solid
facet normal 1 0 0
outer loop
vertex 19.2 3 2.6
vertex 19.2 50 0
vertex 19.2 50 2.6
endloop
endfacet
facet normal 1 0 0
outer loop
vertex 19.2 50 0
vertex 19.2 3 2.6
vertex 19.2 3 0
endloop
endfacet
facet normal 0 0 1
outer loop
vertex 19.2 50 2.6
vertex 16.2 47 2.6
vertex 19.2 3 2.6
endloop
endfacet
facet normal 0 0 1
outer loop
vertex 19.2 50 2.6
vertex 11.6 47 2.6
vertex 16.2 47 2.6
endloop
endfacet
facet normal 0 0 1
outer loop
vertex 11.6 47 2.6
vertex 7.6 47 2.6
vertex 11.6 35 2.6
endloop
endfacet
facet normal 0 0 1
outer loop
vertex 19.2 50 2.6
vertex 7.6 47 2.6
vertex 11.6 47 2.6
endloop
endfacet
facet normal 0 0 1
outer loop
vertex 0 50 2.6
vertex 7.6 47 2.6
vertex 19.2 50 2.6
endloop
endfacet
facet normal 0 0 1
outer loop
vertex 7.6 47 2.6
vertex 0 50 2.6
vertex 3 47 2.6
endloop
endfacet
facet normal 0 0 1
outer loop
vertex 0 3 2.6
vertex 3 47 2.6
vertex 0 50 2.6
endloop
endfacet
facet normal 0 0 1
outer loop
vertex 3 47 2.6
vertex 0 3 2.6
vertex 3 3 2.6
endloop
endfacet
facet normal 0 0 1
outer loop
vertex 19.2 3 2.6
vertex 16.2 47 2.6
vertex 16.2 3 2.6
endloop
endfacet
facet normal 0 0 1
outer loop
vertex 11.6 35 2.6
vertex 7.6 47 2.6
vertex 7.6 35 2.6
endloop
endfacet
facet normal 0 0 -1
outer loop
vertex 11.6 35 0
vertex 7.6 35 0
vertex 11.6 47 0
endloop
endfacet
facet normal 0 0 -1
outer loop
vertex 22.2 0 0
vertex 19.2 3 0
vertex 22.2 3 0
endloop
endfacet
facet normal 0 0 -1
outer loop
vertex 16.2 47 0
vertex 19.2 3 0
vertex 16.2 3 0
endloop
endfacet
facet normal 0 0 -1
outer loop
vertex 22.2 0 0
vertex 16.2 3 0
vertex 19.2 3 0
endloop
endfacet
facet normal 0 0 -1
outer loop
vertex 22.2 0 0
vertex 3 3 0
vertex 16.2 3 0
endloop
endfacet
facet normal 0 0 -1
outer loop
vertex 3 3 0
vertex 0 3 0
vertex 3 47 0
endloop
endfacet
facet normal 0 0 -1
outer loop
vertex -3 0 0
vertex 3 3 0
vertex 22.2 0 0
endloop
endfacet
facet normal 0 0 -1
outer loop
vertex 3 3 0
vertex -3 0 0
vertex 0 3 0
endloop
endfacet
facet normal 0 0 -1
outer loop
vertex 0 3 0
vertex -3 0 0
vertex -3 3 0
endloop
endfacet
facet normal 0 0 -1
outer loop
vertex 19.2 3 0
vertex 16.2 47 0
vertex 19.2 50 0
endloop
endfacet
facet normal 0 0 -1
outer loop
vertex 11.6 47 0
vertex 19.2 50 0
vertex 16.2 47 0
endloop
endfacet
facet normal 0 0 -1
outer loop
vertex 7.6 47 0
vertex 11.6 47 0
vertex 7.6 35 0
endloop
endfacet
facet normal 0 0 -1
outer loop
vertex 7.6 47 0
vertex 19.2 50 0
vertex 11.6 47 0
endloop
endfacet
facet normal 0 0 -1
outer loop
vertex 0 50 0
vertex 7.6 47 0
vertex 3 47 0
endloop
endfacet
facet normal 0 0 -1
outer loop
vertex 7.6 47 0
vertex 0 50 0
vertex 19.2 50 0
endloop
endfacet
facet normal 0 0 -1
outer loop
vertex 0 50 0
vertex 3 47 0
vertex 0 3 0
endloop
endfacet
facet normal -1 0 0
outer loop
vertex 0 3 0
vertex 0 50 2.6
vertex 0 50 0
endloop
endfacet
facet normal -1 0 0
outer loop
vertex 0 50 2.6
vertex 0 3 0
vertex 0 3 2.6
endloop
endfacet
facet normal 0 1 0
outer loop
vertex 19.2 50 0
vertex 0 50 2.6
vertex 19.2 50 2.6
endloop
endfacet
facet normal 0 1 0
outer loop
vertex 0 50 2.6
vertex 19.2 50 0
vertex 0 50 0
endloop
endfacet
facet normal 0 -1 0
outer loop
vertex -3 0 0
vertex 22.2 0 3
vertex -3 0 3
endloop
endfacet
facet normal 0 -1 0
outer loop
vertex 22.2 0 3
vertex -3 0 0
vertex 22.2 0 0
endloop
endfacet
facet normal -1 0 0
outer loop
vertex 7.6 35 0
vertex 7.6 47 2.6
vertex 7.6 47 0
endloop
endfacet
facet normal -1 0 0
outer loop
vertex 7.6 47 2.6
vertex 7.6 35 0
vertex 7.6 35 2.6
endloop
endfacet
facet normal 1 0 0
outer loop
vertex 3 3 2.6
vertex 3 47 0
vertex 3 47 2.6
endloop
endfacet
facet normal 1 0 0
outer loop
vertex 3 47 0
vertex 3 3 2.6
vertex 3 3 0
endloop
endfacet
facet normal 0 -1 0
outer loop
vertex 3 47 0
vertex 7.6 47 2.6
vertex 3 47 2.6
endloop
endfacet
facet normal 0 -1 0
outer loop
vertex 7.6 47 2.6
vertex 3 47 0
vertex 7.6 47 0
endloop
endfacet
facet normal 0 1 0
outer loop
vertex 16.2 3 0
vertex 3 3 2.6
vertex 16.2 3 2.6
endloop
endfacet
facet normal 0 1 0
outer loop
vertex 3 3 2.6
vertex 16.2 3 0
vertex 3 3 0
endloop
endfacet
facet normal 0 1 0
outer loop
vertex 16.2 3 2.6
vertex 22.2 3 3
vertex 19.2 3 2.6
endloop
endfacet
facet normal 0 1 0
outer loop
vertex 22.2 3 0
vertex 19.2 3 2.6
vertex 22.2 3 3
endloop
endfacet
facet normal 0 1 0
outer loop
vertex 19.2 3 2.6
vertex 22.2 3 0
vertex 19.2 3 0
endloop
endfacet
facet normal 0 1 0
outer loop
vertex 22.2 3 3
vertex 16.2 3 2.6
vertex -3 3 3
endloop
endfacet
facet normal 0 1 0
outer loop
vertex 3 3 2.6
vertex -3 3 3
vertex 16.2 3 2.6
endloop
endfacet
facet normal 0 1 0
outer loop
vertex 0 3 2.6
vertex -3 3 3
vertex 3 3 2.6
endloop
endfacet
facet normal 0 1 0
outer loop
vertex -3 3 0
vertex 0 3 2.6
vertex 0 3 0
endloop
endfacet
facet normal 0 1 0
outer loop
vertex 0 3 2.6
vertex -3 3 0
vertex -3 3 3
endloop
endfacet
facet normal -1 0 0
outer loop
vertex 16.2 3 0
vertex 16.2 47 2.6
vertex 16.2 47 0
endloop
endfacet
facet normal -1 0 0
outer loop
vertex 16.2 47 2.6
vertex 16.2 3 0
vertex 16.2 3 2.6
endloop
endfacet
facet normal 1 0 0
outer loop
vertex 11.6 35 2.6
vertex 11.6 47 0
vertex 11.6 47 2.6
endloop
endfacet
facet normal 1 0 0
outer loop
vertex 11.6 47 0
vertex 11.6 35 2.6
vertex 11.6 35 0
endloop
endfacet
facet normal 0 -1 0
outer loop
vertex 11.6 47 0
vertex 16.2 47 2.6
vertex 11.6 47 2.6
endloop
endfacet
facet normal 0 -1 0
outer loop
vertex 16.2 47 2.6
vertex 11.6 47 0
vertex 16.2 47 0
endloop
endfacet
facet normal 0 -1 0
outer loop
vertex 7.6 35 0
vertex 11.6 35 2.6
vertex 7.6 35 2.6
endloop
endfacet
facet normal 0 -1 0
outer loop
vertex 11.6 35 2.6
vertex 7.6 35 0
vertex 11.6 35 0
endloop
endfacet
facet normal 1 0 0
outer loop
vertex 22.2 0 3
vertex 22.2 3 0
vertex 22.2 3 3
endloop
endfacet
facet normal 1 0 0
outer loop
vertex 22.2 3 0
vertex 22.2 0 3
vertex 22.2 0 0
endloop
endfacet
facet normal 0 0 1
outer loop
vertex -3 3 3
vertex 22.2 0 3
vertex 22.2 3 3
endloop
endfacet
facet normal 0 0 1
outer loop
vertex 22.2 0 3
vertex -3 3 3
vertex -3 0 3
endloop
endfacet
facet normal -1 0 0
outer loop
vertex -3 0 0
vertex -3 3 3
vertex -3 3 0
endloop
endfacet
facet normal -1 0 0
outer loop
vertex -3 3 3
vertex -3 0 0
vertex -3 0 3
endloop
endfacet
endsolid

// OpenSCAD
/**
 * Originally:
 * Módulo que permite trabajar con patrones hexagonales tipo panal.
 *
 * @author  Joaquín Fernández
 * @url     https://gitlab.com/joaquinfq/openscad/blob/master/Modules/Pattern/honeycomb.scad
 * @license CC-BY-NC-4.0
 * @see     http://www.thingiverse.com/thing:2124344
 * Modified by: John Flinchbaugh
 * Added the sleeve, tabs, and a measurement-sized module.
 */
/**
 * Dibuja un panal de miel completo.
 *
 * @param {Number} columns   Número de columnas (Eje X).
 * @param {Number} rows      Número de filas (Eje Y).
 * @param {Number} height    Altura del cubo (Eje Z).
 * @param {Number} size      Tamaño del hexágono.
 * @param {Number} thickness Grosor de las paredes del panal.
 */
module honeycomb(columns, rows, height, size, thickness)
{
    _halfSize = size / 2;
    for (_row = [ 0 : rows ]) {
        translate([ 
            (_row % 2) * _halfSize, 
            _row * _halfSize * sqrt(3), 
            0 
        ]) {
            for (_column = [0 : columns]) {
                translate([ _column * size, 0, 0 ]) {
                    rotate([0, 0, 30]) {
                        cylinder(
                            r   = (size - thickness) / sqrt(3),
                            h   = height,
                            $fn = 6
                        );
                    }
                }
            }
        }
    }
}
/**
 * Dibuja un panal acotado por un cubo hueco.
 *
 * @param {Number} columns   Número de columnas (Eje X).
 * @param {Number} rows      Número de filas (Eje Y).
 * @param {Number} height    Altura del cubo (Eje Z).
 * @param {Number} size      Tamaño del hexágono.
 * @param {Number} thickness Grosor de las paredes del panal.
 */
module honeycombCube(columns, rows, height, size, thickness,   sleeve_thickness, slot_width) {
    _width  = (columns ) * size;
    _length = (rows) * size * sqrt(3) / 2;
    difference() {
        // main body
        translate([sleeve_thickness, sleeve_thickness, 0]) {
            minkowski() {
                cube([ 
                    _width + sleeve_thickness , 
                    _length - sleeve_thickness, 
                    height + sleeve_thickness - 1]);
                cylinder(r=sleeve_thickness, h = 1);
            }
        }

        // carve out indent for sleeve
        translate([
            sleeve_thickness * 3, 
            sleeve_thickness * 3/2, 
            height
        ]) {
            minkowski() {
                cube([ 
                    _width - 3 * sleeve_thickness, 
                    _length - 2 * sleeve_thickness, 
                    sleeve_thickness - 1
                ]);
                cylinder(r=sleeve_thickness/2, h = 1);
            }
        }

        // carve out honey comb
        intersection() {
            translate([
                sleeve_thickness * 3, 
                sleeve_thickness * 3/2, 
                0
            ]) {
                minkowski() {
                    cube([ 
                        _width - 3 * sleeve_thickness, 
                        _length - 2 * sleeve_thickness, 
                        height
                    ]);
                    cylinder(r=sleeve_thickness/2, h = 1);
                }
            }

            translate([
                sleeve_thickness, 
                sleeve_thickness / 2, 
                0 
            ]) {
                honeycomb(columns + 1, rows + 1, height, size, thickness);
            }
        }

        // carve out slots
        translate([
            sleeve_thickness * 3/4, 
            (sleeve_thickness + _length - slot_width) / 2,
            0
        ]) {
            cube([
                sleeve_thickness, 
                slot_width, 
                height + sleeve_thickness
            ]);
        }

        translate([
            sleeve_thickness * 5/4 + _width, 
            (sleeve_thickness + _length - slot_width) / 2,
            0
        ]) {
            cube([
                sleeve_thickness, 
                slot_width, 
                height + sleeve_thickness
            ]);
        }
    }
}

module honeycombCubeSize(
    width,
    length,
    height,
    size,
    thickness,
    sleeve_thickness,
    slot_width
) {
    columns = (width + sleeve_thickness * 2)  / size;
    rows = (length + sleeve_thickness* 2) / size / sqrt(3) * 2;

    honeycombCube(
        columns,
        rows,
        height,
        size,
        thickness,
        sleeve_thickness,
        slot_width
    );
}



// 66 x 41 - YN-460II
//honeycombCubeSize(66, 42, 15, 6.6, 0.43, 1.6, 15);


sleeve_thickness = 3.0; // mm
tolerance = 0.4; //mm
strap_length = 50; // mm
// 77 x 49 - YN-560IV
// honeycombCubeSize(77, 49, 17, 6.6, 0.5, sleeve_thickness, 20);

// straps
module strap(strap_length, sleeve_thickness, tolerance) {
    difference() {
        cube([
            20 - 2 * tolerance, 
            strap_length, 
            sleeve_thickness - tolerance
        ]);
        translate([sleeve_thickness, sleeve_thickness, 0]) {
            cube([
                20 - tolerance - 5 * sleeve_thickness, 
                strap_length - 2 * sleeve_thickness,
                sleeve_thickness - tolerance
            ]);
        }
        translate([sleeve_thickness * 4 - tolerance, sleeve_thickness, 0]) {
            cube([
                20 - tolerance - 5 * sleeve_thickness, 
                strap_length - 2 * sleeve_thickness,
                sleeve_thickness - tolerance
            ]);
        }
        translate([sleeve_thickness, sleeve_thickness, 0]) {
            cube([
                20 - 2 * tolerance - 2 * sleeve_thickness, 
                strap_length - 6 * sleeve_thickness,
                sleeve_thickness - tolerance
            ]);
        }
    }
    translate([-1 * sleeve_thickness, 0, 0]) {
        cube([
            20 + 2 * sleeve_thickness - tolerance * 2, 
            sleeve_thickness, 
            sleeve_thickness
        ]);
    }
}

strap(strap_length, sleeve_thickness, tolerance);
